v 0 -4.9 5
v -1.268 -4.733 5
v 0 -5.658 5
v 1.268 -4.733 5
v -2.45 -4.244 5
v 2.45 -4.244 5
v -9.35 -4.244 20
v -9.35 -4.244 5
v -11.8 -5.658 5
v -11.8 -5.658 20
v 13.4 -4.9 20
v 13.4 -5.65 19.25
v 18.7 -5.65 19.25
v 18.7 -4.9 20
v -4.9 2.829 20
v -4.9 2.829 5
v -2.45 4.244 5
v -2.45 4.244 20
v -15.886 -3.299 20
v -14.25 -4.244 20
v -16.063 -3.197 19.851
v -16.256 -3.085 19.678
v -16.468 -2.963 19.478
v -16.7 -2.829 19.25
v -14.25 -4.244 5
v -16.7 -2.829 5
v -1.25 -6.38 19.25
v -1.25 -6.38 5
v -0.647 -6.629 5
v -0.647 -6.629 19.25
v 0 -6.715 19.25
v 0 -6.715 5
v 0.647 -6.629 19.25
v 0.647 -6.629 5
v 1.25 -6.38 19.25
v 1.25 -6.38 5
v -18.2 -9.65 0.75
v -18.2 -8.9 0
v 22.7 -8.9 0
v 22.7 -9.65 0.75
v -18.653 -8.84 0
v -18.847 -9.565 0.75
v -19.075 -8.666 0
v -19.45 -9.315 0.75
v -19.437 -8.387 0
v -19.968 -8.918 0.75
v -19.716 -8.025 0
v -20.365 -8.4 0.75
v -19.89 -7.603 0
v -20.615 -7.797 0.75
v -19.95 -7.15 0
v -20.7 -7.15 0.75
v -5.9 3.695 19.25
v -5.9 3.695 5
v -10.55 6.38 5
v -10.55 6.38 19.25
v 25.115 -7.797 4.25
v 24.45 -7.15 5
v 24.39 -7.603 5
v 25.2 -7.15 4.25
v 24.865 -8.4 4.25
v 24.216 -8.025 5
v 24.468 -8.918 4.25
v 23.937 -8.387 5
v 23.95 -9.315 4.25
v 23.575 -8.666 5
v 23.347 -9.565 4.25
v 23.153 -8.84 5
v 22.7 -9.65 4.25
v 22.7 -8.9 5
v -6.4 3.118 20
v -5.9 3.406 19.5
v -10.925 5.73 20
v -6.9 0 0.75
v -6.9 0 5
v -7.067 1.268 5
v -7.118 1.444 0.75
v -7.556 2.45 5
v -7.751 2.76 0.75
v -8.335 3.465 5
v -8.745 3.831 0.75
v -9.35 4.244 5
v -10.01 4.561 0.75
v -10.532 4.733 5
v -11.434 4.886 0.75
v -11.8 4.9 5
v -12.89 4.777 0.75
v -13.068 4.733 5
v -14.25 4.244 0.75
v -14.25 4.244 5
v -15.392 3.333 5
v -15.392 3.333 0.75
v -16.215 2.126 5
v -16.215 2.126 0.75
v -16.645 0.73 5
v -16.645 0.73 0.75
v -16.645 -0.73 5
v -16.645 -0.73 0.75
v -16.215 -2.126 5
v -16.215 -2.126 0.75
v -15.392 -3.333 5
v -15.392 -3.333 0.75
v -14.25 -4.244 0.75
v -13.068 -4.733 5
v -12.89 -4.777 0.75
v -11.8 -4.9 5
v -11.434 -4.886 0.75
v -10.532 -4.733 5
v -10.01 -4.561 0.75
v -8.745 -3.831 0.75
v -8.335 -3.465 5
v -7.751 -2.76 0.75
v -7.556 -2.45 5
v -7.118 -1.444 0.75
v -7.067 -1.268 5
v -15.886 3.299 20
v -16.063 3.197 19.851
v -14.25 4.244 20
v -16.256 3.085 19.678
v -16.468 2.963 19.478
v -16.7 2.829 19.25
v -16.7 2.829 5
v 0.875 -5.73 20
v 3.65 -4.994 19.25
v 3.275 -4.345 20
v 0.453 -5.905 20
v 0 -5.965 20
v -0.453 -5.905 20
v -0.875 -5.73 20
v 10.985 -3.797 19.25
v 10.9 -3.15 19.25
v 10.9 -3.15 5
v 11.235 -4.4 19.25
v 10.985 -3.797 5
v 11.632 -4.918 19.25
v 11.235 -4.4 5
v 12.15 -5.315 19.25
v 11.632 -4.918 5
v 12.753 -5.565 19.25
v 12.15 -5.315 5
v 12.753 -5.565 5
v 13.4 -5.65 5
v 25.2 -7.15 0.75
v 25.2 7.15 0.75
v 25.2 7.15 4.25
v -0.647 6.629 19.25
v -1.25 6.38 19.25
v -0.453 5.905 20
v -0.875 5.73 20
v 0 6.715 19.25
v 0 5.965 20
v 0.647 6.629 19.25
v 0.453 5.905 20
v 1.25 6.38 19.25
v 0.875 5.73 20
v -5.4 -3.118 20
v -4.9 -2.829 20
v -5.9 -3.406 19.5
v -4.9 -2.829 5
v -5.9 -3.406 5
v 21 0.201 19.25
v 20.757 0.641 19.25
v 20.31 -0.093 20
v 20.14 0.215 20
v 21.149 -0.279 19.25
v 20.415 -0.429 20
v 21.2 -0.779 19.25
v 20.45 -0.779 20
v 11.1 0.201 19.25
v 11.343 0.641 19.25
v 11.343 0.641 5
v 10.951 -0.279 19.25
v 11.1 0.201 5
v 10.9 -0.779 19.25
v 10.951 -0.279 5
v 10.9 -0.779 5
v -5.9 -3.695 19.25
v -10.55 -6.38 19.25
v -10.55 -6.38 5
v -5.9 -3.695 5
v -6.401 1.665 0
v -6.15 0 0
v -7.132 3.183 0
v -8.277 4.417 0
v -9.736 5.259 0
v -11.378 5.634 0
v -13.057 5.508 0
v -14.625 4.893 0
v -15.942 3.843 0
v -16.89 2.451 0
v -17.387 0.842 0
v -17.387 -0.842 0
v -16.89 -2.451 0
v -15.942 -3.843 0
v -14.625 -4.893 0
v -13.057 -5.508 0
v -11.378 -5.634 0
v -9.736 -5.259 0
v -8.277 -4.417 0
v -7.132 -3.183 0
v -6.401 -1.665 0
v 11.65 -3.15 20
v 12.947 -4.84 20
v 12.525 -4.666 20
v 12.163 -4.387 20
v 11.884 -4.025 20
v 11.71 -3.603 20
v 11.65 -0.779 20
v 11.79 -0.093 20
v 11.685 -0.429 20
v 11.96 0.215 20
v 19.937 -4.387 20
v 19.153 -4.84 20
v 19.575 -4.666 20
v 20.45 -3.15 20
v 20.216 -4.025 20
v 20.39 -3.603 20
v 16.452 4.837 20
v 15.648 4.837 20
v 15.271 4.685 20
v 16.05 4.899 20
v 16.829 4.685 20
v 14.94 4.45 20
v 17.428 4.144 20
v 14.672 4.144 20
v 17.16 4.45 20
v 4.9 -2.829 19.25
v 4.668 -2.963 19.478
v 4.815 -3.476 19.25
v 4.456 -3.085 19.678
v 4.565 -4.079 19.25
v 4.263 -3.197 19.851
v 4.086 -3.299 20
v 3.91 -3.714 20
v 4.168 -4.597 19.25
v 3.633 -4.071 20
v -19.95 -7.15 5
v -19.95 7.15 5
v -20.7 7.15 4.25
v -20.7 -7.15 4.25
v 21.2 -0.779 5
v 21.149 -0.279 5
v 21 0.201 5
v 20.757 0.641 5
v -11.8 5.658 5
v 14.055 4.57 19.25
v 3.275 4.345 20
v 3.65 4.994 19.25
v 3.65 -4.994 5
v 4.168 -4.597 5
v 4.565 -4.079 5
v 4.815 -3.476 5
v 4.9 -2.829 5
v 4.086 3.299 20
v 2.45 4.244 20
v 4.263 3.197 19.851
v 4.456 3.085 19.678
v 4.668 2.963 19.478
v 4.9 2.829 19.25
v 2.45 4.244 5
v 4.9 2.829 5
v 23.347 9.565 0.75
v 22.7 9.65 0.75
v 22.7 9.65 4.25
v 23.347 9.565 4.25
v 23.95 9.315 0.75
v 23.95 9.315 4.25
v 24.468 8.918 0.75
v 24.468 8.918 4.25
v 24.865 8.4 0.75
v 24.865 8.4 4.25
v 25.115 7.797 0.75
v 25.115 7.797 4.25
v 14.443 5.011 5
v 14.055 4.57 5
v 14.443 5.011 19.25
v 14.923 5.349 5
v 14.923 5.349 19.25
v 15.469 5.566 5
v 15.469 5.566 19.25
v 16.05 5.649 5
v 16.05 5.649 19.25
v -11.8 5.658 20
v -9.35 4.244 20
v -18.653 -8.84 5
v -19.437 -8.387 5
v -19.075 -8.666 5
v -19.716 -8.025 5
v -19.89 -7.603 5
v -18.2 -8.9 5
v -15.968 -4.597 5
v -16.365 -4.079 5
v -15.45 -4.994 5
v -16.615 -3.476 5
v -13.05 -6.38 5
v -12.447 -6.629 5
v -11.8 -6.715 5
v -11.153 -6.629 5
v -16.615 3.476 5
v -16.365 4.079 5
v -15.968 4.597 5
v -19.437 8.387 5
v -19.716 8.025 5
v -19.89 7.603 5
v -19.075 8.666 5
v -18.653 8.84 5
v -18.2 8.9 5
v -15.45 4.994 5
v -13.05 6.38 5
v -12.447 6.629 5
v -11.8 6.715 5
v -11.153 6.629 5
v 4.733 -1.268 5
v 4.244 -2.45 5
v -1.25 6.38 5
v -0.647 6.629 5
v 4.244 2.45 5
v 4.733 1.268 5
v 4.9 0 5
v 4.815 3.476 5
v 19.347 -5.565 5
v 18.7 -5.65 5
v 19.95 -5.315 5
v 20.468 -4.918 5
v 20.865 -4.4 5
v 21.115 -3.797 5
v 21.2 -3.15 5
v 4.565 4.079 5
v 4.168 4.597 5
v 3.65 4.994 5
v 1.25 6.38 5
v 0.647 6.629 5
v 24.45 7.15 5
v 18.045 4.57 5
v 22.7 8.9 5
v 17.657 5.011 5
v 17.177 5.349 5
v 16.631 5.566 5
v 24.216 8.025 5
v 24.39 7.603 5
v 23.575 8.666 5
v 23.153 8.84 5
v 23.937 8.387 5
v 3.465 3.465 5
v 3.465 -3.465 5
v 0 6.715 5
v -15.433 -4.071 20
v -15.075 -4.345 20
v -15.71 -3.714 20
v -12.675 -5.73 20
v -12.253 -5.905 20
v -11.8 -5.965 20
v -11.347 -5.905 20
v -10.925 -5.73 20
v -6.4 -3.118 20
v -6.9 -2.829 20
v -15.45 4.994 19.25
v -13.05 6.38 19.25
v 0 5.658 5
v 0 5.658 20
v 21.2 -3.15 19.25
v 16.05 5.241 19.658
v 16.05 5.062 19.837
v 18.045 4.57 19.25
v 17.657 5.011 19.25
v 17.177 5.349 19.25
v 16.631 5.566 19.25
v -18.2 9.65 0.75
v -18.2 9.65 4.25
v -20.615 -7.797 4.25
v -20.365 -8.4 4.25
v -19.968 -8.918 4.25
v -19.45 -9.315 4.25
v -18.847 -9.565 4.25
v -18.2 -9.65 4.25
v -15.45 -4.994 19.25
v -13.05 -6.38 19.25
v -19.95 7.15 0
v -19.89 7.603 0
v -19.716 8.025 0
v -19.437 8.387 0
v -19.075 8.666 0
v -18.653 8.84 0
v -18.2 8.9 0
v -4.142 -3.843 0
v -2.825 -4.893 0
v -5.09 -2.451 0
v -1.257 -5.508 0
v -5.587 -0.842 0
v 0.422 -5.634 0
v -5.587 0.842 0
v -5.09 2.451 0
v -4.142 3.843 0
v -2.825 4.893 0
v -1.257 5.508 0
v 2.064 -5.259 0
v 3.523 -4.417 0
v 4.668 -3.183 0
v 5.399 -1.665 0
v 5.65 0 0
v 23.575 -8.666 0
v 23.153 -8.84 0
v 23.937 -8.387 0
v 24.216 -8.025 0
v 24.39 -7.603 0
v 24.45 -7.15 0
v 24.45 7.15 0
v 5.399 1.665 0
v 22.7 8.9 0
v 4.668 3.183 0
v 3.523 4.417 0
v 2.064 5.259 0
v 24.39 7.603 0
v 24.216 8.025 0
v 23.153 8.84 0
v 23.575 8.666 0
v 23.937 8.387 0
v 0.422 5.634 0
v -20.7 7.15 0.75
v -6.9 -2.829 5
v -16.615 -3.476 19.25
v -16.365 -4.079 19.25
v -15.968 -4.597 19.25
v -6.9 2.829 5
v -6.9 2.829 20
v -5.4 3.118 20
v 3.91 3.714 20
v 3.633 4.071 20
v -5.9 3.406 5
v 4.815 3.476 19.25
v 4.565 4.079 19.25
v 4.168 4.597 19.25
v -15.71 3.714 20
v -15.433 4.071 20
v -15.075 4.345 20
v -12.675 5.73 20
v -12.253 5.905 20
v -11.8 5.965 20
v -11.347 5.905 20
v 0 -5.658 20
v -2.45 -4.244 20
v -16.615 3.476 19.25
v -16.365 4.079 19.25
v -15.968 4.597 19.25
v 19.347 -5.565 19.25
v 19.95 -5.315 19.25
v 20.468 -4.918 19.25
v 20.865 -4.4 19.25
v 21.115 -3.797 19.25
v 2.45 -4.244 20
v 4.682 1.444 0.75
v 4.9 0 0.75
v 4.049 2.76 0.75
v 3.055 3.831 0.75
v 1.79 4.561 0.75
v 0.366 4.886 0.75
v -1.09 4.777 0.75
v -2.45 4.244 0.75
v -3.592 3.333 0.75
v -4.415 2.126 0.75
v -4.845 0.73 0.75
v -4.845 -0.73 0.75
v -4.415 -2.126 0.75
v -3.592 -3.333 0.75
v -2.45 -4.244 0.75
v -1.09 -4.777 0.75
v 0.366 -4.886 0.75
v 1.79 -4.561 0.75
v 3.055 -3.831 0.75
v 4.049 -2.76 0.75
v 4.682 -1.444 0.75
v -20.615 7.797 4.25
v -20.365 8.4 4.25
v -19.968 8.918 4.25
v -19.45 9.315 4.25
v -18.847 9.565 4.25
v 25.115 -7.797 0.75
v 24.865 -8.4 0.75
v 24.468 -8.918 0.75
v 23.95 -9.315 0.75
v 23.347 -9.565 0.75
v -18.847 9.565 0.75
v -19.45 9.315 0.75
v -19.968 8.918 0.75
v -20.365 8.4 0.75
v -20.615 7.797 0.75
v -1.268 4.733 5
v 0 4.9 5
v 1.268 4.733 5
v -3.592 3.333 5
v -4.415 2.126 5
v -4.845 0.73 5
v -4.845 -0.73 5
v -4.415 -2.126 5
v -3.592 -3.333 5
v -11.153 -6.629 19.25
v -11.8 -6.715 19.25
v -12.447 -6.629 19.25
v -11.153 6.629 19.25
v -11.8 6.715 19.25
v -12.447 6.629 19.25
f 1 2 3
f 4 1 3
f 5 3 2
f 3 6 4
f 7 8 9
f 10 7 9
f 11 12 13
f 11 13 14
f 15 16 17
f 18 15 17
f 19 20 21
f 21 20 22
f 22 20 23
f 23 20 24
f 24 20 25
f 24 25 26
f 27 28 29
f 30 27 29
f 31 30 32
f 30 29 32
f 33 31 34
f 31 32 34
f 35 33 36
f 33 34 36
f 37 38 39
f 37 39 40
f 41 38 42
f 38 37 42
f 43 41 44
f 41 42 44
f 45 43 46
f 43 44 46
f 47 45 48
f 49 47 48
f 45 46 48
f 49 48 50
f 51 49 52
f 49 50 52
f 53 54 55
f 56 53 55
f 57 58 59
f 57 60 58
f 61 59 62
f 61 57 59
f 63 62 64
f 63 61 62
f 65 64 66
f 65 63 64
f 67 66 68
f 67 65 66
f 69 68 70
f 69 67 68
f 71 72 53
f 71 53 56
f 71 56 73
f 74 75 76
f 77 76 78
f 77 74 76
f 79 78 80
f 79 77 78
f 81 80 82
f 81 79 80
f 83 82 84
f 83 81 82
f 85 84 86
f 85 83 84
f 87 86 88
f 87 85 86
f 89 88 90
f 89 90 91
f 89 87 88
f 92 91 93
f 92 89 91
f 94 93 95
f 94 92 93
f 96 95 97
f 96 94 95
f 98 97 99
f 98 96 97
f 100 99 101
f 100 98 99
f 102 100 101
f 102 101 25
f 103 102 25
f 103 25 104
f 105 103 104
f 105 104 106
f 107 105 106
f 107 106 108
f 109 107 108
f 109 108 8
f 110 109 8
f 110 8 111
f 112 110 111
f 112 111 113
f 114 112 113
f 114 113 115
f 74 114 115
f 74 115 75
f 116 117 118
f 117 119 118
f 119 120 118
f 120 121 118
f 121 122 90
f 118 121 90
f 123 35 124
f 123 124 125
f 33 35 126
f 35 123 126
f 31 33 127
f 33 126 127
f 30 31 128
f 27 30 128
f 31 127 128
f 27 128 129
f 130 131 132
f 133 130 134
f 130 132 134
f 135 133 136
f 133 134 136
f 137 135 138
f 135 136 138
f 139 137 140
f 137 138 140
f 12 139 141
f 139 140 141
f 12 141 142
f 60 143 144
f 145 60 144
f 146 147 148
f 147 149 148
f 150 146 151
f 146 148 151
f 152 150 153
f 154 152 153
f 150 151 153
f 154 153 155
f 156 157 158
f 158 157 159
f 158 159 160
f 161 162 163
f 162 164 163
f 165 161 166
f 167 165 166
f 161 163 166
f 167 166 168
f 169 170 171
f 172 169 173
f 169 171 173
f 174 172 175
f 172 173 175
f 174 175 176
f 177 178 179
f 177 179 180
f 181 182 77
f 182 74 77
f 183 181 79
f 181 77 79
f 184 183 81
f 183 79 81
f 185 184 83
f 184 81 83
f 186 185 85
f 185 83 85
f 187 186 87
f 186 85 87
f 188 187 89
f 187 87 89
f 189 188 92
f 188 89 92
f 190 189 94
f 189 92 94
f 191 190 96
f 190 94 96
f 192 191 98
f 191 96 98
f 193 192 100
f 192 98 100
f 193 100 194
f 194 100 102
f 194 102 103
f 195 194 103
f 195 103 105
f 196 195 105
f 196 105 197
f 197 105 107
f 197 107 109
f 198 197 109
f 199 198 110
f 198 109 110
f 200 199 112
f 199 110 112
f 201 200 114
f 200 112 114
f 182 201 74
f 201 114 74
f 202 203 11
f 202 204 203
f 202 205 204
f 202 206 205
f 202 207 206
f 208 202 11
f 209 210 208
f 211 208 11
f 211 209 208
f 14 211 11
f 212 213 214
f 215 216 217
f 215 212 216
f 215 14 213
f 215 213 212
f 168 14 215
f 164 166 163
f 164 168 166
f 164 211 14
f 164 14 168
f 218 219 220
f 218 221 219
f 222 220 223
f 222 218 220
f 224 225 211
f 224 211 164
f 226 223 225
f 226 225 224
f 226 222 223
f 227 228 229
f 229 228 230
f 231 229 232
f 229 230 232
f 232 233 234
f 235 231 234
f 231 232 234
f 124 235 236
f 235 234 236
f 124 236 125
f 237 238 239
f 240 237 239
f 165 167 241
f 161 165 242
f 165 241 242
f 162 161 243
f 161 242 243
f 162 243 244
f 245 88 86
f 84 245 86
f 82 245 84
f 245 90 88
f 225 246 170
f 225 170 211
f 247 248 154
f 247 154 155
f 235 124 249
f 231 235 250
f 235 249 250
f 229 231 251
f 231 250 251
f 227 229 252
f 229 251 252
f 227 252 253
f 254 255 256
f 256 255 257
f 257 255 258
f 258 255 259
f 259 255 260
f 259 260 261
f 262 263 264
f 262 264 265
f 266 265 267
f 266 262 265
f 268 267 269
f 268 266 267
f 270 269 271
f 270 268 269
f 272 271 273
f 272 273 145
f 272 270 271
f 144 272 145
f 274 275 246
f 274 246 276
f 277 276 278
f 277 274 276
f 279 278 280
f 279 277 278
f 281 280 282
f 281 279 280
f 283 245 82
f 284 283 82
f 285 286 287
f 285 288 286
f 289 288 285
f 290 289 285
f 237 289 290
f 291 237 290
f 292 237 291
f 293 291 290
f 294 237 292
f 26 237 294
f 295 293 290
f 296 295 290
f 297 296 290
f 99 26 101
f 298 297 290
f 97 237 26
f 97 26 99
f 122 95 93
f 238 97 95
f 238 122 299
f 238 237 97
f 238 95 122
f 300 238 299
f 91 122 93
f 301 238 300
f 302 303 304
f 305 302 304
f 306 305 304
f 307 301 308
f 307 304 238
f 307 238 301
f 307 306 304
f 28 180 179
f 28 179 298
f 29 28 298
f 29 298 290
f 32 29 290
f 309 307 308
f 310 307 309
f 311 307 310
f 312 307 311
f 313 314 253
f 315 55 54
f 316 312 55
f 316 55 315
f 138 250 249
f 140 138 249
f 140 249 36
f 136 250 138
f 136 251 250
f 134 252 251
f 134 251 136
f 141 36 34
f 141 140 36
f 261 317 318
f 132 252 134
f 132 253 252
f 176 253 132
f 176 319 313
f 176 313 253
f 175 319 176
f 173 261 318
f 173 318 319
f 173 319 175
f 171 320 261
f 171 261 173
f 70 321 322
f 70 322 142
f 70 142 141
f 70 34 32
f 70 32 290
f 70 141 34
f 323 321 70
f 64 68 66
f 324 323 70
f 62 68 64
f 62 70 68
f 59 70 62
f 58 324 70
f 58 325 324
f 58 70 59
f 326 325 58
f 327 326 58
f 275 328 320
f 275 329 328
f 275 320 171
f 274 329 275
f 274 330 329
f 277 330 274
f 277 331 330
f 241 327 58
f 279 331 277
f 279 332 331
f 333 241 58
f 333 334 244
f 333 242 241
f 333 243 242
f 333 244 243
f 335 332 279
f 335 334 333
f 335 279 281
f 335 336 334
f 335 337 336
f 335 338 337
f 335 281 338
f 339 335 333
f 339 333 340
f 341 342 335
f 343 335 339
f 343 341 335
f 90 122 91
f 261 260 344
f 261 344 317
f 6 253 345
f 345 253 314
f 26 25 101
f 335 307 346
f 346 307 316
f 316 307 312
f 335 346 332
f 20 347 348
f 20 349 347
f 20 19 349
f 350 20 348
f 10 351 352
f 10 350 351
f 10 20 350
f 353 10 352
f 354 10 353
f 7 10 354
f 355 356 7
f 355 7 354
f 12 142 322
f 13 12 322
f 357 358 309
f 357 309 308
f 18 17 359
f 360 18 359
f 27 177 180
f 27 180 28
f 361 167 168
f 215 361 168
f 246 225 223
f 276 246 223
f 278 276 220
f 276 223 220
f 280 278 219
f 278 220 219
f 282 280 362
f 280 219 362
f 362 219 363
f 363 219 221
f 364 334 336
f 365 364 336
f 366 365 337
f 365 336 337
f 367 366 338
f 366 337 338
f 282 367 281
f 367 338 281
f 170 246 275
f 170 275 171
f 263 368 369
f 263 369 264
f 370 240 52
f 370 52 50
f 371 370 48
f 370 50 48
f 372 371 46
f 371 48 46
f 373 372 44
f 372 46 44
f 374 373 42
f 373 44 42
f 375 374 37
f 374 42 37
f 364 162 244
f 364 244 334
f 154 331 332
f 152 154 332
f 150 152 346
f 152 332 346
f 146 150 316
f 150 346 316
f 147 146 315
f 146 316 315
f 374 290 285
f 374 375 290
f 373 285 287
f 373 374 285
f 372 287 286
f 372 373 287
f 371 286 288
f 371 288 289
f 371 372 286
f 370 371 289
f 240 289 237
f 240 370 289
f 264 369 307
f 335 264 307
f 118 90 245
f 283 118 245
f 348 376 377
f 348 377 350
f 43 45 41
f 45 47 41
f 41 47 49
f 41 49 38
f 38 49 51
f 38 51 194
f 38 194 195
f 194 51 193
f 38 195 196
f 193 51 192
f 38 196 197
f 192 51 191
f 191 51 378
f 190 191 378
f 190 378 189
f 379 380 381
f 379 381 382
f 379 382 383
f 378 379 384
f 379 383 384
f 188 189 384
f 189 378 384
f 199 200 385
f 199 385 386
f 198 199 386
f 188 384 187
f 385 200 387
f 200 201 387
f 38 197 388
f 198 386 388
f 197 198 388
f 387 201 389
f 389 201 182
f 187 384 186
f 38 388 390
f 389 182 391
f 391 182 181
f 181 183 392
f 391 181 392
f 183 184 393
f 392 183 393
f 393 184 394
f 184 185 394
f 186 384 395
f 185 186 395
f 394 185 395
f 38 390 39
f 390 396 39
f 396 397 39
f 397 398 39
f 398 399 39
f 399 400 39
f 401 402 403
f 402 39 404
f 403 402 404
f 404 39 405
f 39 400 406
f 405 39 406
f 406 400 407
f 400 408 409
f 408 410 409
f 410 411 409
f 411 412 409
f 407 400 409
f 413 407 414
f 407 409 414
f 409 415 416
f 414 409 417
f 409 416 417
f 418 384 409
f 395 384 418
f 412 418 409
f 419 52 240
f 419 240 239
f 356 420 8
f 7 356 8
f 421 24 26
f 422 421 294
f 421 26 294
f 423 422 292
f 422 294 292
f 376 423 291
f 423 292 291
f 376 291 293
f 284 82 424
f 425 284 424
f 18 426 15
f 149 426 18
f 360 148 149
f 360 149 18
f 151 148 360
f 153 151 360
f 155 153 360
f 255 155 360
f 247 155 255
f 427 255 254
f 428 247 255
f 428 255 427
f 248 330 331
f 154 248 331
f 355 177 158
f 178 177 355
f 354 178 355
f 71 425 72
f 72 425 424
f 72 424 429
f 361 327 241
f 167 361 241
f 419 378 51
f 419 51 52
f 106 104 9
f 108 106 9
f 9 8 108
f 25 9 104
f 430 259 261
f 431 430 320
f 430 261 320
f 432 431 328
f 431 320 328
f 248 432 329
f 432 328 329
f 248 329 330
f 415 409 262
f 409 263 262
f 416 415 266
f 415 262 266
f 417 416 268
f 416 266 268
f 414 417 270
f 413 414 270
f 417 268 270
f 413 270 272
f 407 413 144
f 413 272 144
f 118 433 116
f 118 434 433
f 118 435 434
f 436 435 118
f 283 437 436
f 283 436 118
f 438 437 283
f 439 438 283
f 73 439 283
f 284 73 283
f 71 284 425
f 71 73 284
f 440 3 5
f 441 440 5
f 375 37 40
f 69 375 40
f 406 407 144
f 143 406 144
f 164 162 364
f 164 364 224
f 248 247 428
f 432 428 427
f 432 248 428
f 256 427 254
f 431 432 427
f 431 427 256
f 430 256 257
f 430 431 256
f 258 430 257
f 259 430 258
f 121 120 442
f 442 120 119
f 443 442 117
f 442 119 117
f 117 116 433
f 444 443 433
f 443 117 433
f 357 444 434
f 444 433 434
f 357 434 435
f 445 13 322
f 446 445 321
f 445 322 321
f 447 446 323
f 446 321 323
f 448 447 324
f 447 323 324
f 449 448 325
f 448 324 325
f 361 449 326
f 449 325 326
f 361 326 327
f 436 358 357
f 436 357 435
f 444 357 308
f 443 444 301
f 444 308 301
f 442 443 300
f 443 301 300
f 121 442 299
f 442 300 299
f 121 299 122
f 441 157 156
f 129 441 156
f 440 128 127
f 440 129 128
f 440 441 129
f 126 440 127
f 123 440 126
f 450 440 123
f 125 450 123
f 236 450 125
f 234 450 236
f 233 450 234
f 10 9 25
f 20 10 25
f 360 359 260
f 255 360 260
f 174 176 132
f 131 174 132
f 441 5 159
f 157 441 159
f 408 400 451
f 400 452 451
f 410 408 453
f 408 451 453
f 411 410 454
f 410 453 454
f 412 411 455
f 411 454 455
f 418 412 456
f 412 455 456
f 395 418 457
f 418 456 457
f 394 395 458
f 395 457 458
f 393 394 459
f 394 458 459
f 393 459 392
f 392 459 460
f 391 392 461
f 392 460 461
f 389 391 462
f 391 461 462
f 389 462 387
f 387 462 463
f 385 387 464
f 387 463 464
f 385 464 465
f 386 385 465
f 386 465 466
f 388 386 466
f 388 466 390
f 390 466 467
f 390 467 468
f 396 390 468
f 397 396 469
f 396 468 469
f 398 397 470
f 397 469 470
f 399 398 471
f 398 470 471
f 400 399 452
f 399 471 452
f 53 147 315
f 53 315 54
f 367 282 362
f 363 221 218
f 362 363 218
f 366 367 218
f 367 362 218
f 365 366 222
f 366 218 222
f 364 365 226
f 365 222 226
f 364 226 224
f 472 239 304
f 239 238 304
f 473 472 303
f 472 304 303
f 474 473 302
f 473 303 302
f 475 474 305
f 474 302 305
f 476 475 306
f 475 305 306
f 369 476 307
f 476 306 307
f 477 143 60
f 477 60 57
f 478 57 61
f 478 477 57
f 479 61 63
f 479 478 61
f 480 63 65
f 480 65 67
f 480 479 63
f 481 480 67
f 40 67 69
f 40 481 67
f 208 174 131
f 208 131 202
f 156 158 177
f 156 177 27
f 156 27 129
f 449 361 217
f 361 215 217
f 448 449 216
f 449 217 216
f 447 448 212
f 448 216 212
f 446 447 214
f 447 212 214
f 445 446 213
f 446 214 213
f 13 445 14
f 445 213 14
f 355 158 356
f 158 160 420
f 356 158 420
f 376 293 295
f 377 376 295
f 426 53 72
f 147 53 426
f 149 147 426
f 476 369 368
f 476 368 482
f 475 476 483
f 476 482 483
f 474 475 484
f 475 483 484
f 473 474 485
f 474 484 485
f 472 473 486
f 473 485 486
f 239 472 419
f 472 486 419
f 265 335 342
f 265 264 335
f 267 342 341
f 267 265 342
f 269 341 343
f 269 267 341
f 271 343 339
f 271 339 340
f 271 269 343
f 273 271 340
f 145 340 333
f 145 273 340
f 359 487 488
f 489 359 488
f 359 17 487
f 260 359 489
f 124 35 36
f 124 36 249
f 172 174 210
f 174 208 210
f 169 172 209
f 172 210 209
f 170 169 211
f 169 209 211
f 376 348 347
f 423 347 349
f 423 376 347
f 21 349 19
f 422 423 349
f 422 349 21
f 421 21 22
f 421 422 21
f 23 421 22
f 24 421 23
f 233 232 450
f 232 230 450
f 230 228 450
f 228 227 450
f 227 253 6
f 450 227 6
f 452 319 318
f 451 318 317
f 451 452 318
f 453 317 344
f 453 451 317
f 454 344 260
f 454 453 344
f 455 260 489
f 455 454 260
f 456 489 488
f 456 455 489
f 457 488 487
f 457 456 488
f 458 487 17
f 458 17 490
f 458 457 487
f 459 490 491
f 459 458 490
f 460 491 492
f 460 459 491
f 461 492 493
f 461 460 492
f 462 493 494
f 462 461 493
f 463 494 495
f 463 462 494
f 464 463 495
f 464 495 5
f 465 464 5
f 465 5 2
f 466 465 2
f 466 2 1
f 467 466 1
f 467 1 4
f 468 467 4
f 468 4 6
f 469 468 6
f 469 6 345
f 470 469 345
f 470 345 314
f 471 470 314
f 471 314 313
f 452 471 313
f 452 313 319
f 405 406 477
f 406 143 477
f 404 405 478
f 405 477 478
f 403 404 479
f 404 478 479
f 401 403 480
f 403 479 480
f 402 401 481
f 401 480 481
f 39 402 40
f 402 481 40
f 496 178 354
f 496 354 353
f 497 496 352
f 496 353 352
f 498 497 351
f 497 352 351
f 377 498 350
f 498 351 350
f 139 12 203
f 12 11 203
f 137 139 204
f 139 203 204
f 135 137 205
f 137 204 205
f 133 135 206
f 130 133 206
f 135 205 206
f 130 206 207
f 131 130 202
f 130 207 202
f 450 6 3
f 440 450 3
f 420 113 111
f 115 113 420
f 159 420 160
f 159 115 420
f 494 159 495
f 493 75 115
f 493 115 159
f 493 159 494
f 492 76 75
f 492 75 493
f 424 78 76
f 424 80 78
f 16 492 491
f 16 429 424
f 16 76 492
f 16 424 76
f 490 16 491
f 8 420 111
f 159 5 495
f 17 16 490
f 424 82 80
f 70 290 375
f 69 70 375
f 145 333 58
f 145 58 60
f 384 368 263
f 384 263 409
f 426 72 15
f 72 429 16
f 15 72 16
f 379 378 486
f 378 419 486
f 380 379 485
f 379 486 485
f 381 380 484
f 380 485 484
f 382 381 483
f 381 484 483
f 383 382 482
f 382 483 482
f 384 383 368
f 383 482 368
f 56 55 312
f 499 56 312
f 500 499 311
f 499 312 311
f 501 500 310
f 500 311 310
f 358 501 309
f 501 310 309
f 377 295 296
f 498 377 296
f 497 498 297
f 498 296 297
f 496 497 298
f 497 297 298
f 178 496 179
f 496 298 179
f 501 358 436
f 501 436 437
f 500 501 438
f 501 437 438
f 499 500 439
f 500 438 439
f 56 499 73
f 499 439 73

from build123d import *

# Parameters (mm, degrees)
F0_W          = 45.9
F0_H          = 19.3
F0_R          = 4.9
F1_DEPTH      = 5
F3_DEPTH      = 15
F4_T1_DEPTH   = 17.5
F4_T3_DEPTH   = 18.2802116758
F4_T5_DEPTH   = 21.25
F4_T7_DEPTH   = 16.9476143508
F4_T9_DEPTH   = 18.6084391824
F4_T11_DEPTH  = 22.2168783649
F5_T1_DEPTH   = 4.7741809443
F5_T3_DEPTH   = 2.3709542597
F5_T5_DEPTH   = 5.3
F5_T7_DEPTH   = 4.7741809443
F5_T9_DEPTH   = 40.9
F5_T11_DEPTH  = 14.3
F5_T13_DEPTH  = 2.7712812921
F5_T15_DEPTH  = 2.7712812921
F5_T17_DEPTH  = 2.7712812921
F5_T19_DEPTH  = 2.7712812921
F5_T22_ANGLE  = 98.1713551602
F5_T24_ANGLE  = 98.1713551602
F5_T26_ANGLE  = 34.6159793172
F5_T28_ANGLE  = 90.0000000053
F5_T30_ANGLE  = 90.0000000053
F5_T32_ANGLE  = 34.6159793172
F5_T34_ANGLE  = 90.0000000053
F5_T36_ANGLE  = 90.0000000053
F5_T38_ANGLE  = 90.0000000053
F5_T40_ANGLE  = 90.0000000053
F5_T48_DEPTH  = 7.2981197444
F5_T51_ANGLE  = 60.0000000105
F5_T53_ANGLE  = 90.0000000053
F5_T55_ANGLE  = 90.0000000053
F5_T57_ANGLE  = 90.0000000053
F5_T59_ANGLE  = 90.0000000053
F5_T63_DEPTH  = 7.2981197444
F5_T68_DEPTH  = 7.2981197444
F5_T71_ANGLE  = 60.0000000105
F5_T73_ANGLE  = 60.0000000105
F5_T77_DEPTH  = 7.2981197444
F5_T80_ANGLE  = 60.0000000105
F5_T82_ANGLE  = 104.2118652522
F5_T84_ANGLE  = 104.2118652522
F5_T86_ANGLE  = 104.2118652522
F5_T88_ANGLE  = 104.2118652522
F5_T93_DEPTH  = 7.2981197444
F5_T97_DEPTH  = 7.2981197444
F5_T104_DEPTH = 7.2981197444
F5_T108_DEPTH = 7.2981197444


# Not quite as in the source:
# - a fillet or chamfer that OpenCascade refuses, or shapes differently, is made with other operations: its cross-section is extruded or revolved along the edge and cut away or added
# - a feature names something its author has since deleted; it is built from what else it names


with BuildPart() as f1:
    # F0 (on Top) → F1 (new body)
    with BuildSketch(Plane.XY):
        with Locations((2.25, 0)):
            Rectangle(F0_W, F0_H)
        with Locations((-11.8, 0)):
            Circle(F0_R, mode=Mode.SUBTRACT)
        Circle(F0_R, mode=Mode.SUBTRACT)
        Polygon((10.9, 0), (14.8, 5.65), (17.3, 5.65), (21.2, 0), (21.2, -5.65), (10.9, -5.65), align=None, mode=Mode.SUBTRACT)
        Polygon((17.3, 5.65), (14.8, 5.65), (10.9, 0), (10.9, -5.65), (21.2, -5.65), (21.2, 0), align=None)
    extrude(amount=F1_DEPTH)

    # F2 (on face) → F3 (join)
    with BuildSketch(Plane.XY.offset(5)):
        Polygon((14.8, 5.65), (10.9, 0), (10.9, -5.65), (21.2, -5.65), (21.2, 0), (17.3, 5.65), align=None)
        Polygon((-5.65, -3.5507041555), (-5.9, -3.4063665882), (-6.15, -3.5507041555), (-5.9, -3.6950417228), align=None)
        Polygon((-5.9, -3.4063665882), (-6.9, -2.829016319), (-9.3500000593, -4.2435245128), (-11.8, -5.6580326381), (-14.2500001426, -4.2435243962), (-16.7, -2.829016319), (-17.95, -3.5507041555), (-11.8, -7.101408311), (-5.9, -3.6950417228), (-6.15, -3.5507041555), align=None)
        Polygon((-4.9, -2.829016319), (-5.9, -3.4063665882), (-5.65, -3.5507041555), (-5.9, -3.6950417228), (0, -7.101408311), (6.15, -3.5507041555), (4.9, -2.829016319), (2.4499999307, -4.2435245185), (0, -5.6580326381), (-2.4500000255, -4.2435244638), align=None)
        Polygon((-4.9, 2.829016319), (-2.4499999531, 4.2435245056), (0, 5.6580326381), (2.4500000055, 4.2435244754), (4.9, 2.829016319), (6.15, 3.5507041555), (0, 7.101408311), (-5.9, 3.6950417228), (-5.65, 3.5507041555), (-5.9, 3.4063665882), align=None)
        Polygon((-16.7, 2.829016319), (-14.2499999083, 4.2435245315), (-11.8, 5.6580326381), (-9.3500001117, 4.243524543), (-6.9, 2.829016319), (-5.9, 3.4063665882), (-6.15, 3.5507041555), (-5.9, 3.6950417228), (-11.8, 7.101408311), (-17.95, 3.5507041555), align=None)
        Polygon((-6.15, 3.5507041555), (-5.9, 3.4063665882), (-5.65, 3.5507041555), (-5.9, 3.6950417228), align=None)
    extrude(amount=F3_DEPTH)

    # F4: fillet of radius 2.5 on 18 edges, made by hand

    # F4_s2 → F4_t1 (cut)
    with BuildSketch(Plane.XY.offset(-6.25)):
        with BuildLine():
            ThreePointArc((25.2, -7.15), (24.467766953, -8.917766953), (22.7, -9.65))
            Line((22.7, -9.65), (25.2, -9.65))
            Line((25.2, -9.65), (25.2, -7.15))
        make_face()
        with BuildLine():
            ThreePointArc((22.7, 9.65), (24.467766953, 8.917766953), (25.2, 7.15))
            Line((25.2, 7.15), (25.2, 9.65))
            Line((25.2, 9.65), (22.7, 9.65))
        make_face()
        with BuildLine():
            ThreePointArc((-18.2, 9.65), (-19.967766953, 8.917766953), (-20.7, 7.15))
            Line((-20.7, 7.15), (-20.7, 9.65))
            Line((-20.7, 9.65), (-18.2, 9.65))
        make_face()
        with BuildLine():
            ThreePointArc((-20.7, -7.15), (-19.967766953, -8.917766953), (-18.2, -9.65))
            Line((-18.2, -9.65), (-20.7, -9.65))
            Line((-20.7, -9.65), (-20.7, -7.15))
        make_face()
    extrude(amount=F4_T1_DEPTH, mode=Mode.SUBTRACT)

    # F4_s4 → F4_t3 (cut)
    with BuildSketch(Plane.XY.offset(5)):
        with BuildLine():
            ThreePointArc((14.0546397462, 4.570183222), (14.9502882284, 5.3636460935), (16.1120846703, 5.65))
            Line((16.1120846703, 5.65), (14.8, 5.65))
            Line((14.8, 5.65), (14.0546397462, 4.570183222))
        make_face()
        with BuildLine():
            ThreePointArc((18.0453602538, 4.570183222), (17.1497117716, 5.3636460935), (15.9879153297, 5.65))
            Line((15.9879153297, 5.65), (17.3, 5.65))
            Line((17.3, 5.65), (18.0453602538, 4.570183222))
        make_face()
    extrude(amount=F4_T3_DEPTH, mode=Mode.SUBTRACT)

    # F4_s6 → F4_t5 (cut)
    with BuildSketch(Plane.XY.offset(5)):
        with BuildLine():
            ThreePointArc((18.7, -5.65), (20.467766953, -4.917766953), (21.2, -3.15))
            Line((21.2, -3.15), (21.2, -5.65))
            Line((21.2, -5.65), (18.7, -5.65))
        make_face()
        with BuildLine():
            ThreePointArc((10.9, -3.15), (11.632233047, -4.917766953), (13.4, -5.65))
            Line((13.4, -5.65), (10.9, -5.65))
            Line((10.9, -5.65), (10.9, -3.15))
        make_face()
    extrude(amount=F4_T5_DEPTH, mode=Mode.SUBTRACT)

    # F4_s8 → F4_t7 (cut)
    with BuildSketch(Plane.XY.offset(5)):
        with BuildLine():
            ThreePointArc((21.2, -0.7790457403), (21.0867983064, -0.0352757189), (20.7574449242, 0.6411374817))
            Line((20.7574449242, 0.6411374817), (21.2, 0))
            Line((21.2, 0), (21.2, -0.7790457403))
        make_face()
        with BuildLine():
            ThreePointArc((11.3425550758, 0.6411374817), (11.0132016936, -0.0352757189), (10.9, -0.7790457403))
            Line((10.9, -0.7790457403), (10.9, 0))
            Line((10.9, 0), (11.3425550758, 0.6411374817))
        make_face()
    extrude(amount=F4_T7_DEPTH, mode=Mode.SUBTRACT)

    # F4_s10 → F4_t9 (cut)
    with BuildSketch(Plane.XY.offset(5)):
        with BuildLine():
            ThreePointArc((-1.25, -6.3797204745), (0, -6.7146569651), (1.25, -6.3797204745))
            Line((1.25, -6.3797204745), (0, -7.101408311))
            Line((0, -7.101408311), (-1.25, -6.3797204745))
        make_face()
        with BuildLine():
            ThreePointArc((-13.05, -6.3797204745), (-11.8, -6.7146569651), (-10.55, -6.3797204745))
            Line((-10.55, -6.3797204745), (-11.8, -7.101408311))
            Line((-11.8, -7.101408311), (-13.05, -6.3797204745))
        make_face()
        with BuildLine():
            ThreePointArc((1.25, 6.3797204745), (0, 6.7146569651), (-1.25, 6.3797204745))
            Line((-1.25, 6.3797204745), (0, 7.101408311))
            Line((0, 7.101408311), (1.25, 6.3797204745))
        make_face()
        with BuildLine():
            ThreePointArc((-10.55, 6.3797204745), (-11.8, 6.7146569651), (-13.05, 6.3797204745))
            Line((-13.05, 6.3797204745), (-11.8, 7.101408311))
            Line((-11.8, 7.101408311), (-10.55, 6.3797204745))
        make_face()
    extrude(amount=F4_T9_DEPTH, mode=Mode.SUBTRACT)

    # F4_s12 → F4_t11 (cut)
    with BuildSketch(Plane.XY.offset(5)):
        with BuildLine():
            ThreePointArc((4.9, 2.829016319), (4.5650635095, 4.079016319), (3.65, 4.9940798285))
            Line((3.65, 4.9940798285), (6.15, 3.5507041555))
            Line((6.15, 3.5507041555), (4.9, 2.829016319))
        make_face()
        with BuildLine():
            ThreePointArc((3.65, -4.9940798285), (4.5650635095, -4.079016319), (4.9, -2.829016319))
            Line((4.9, -2.829016319), (6.15, -3.5507041555))
            Line((6.15, -3.5507041555), (3.65, -4.9940798285))
        make_face()
        with BuildLine():
            ThreePointArc((-16.7, -2.829016319), (-16.3650635095, -4.079016319), (-15.45, -4.9940798285))
            Line((-15.45, -4.9940798285), (-17.95, -3.5507041555))
            Line((-17.95, -3.5507041555), (-16.7, -2.829016319))
        make_face()
        with BuildLine():
            ThreePointArc((-15.45, 4.9940798285), (-16.3650635095, 4.079016319), (-16.7, 2.829016319))
            Line((-16.7, 2.829016319), (-17.95, 3.5507041555))
            Line((-17.95, 3.5507041555), (-15.45, 4.9940798285))
        make_face()
    extrude(amount=F4_T11_DEPTH, mode=Mode.SUBTRACT)

    # F5: chamfer of 0.75 on 45 edges, made by hand

    # F5_s2 → F5_t1 (cut)
    with BuildSketch(Plane(origin=(6.3988388668, -9.2701127172, 0), x_dir=(0, 0, 1), z_dir=(-0.5680732888, 0.8229779697, 0))):
        Polygon((19.25, 17.4471329569), (20, 16.6971329569), (20, 17.4471329569), align=None)
    extrude(amount=F5_T1_DEPTH, mode=Mode.SUBTRACT)

    # F5_s4 → F5_t3 (cut)
    with BuildSketch(Plane.XZ.offset(0.7790457403)):
        Polygon((21.2, 19.25), (20.45, 20), (21.2, 20), align=None)
        Polygon((10.9, 19.25), (11.65, 20), (10.9, 20), align=None)
    extrude(amount=F5_T3_DEPTH, mode=Mode.SUBTRACT)

    # F5_s6 → F5_t5 (cut)
    with BuildSketch(Plane.YZ.offset(13.4)):
        Polygon((-5.65, 19.25), (-4.9, 20), (-5.65, 20), align=None)
    extrude(amount=F5_T5_DEPTH, mode=Mode.SUBTRACT)

    # F5_s8 → F5_t7 (cut)
    with BuildSketch(Plane(origin=(6.6721488959, 9.666061862, 0), x_dir=(0, 0, 1), z_dir=(-0.5680732888, -0.8229779697, 0))):
        Polygon((19.25, -8.9704598694), (20, -9.7204598694), (20, -8.9704598694), align=None)
    extrude(amount=F5_T7_DEPTH, mode=Mode.SUBTRACT)

    # F5_s10 → F5_t9 (cut)
    with BuildSketch(Plane.YZ.offset(-18.2)):
        Polygon((-8.9, 5), (-9.65, 4.25), (-9.65, 5), align=None)
        Polygon((-8.9, 0), (-9.65, 0.75), (-9.65, 0), align=None)
        Polygon((9.65, 0.75), (8.9, 0), (9.65, 0), align=None)
        Polygon((9.65, 4.25), (8.9, 5), (9.65, 5), align=None)
    extrude(amount=F5_T9_DEPTH, mode=Mode.SUBTRACT)

    # F5_s12 → F5_t11 (cut)
    with BuildSketch(Plane.XZ.offset(-7.15)):
        Polygon((24.45, 0), (25.2, 0.75), (25.2, 0), align=None)
        Polygon((-19.95, 0), (-20.7, 0.75), (-20.7, 0), align=None)
        Polygon((-19.95, 5), (-20.7, 4.25), (-20.7, 5), align=None)
        Polygon((24.45, 5), (25.2, 4.25), (25.2, 5), align=None)
    extrude(amount=F5_T11_DEPTH, mode=Mode.SUBTRACT)

    # F5_s14 → F5_t13 (cut)
    with BuildSketch(Plane(origin=(-1.825, -1.0536642413, 0), x_dir=(0, 0, 1), z_dir=(0.8660254038, 0.5, 0))):
        Polygon((19.25, 6.15), (20, 5.4), (20, 6.15), align=None)
    extrude(amount=F5_T13_DEPTH, mode=Mode.SUBTRACT)

    # F5_s16 → F5_t15 (cut)
    with BuildSketch(Plane(origin=(0.575, -0.3319764048, 0), x_dir=(0, 0, 1), z_dir=(-0.8660254038, 0.5, 0))):
        Polygon((19.25, 6.15), (20, 5.4), (20, 6.15), align=None)
    extrude(amount=F5_T15_DEPTH, mode=Mode.SUBTRACT)

    # F5_s18 → F5_t17 (cut)
    with BuildSketch(Plane(origin=(-7.025, -4.0558856411, 0), x_dir=(0, 0, 1), z_dir=(-0.8660254038, -0.5, 0))):
        Polygon((19.25, 12.05), (20, 11.3), (20, 12.05), align=None)
    extrude(amount=F5_T17_DEPTH, mode=Mode.SUBTRACT)

    # F5_s20 → F5_t19 (cut)
    with BuildSketch(Plane(origin=(-9.425, 5.4415262871, 0), x_dir=(0, 0, 1), z_dir=(0.8660254038, -0.5, 0))):
        Polygon((19.25, 12.05), (20, 11.3), (20, 12.05), align=None)
    extrude(amount=F5_T19_DEPTH, mode=Mode.SUBTRACT)

    # F5_s21 → F5_t22 (revolve, cut)
    with BuildSketch(Plane(origin=(6.6721488969, 9.6660618621, 0), x_dir=(0, 0, 1), z_dir=(-0.5680732888, -0.8229779696, 0))):
        Polygon((19.25, -8.9704598686), (20, -9.7204598686), (20, -8.9704598686), align=None)
    revolve(axis=Axis((16.1120846705, 3.1499999997, 20), (0, 0, -1)), revolution_arc=F5_T22_ANGLE, mode=Mode.SUBTRACT)

    # F5_s23 → F5_t24 (revolve, cut)
    with BuildSketch(Plane(origin=(10.1810745714, 9.4235988418, 0), x_dir=(0, 0, 1), z_dir=(-0.7338800405, -0.6792790929, 0))):
        Polygon((19.25, -6.0485344953), (20, -6.7985344953), (20, -6.0485344953), align=None)
    revolve(axis=Axis((15.9879153295, 3.1499999997, 20), (0, 0, -1)), revolution_arc=F5_T24_ANGLE, mode=Mode.SUBTRACT)

    # F5_s25 → F5_t26 (revolve, cut)
    with BuildSketch(Plane(origin=(6.3988388671, -9.2701127174, 0), x_dir=(0, 0, 1), z_dir=(-0.5680732888, 0.8229779697, 0))):
        Polygon((19.25, 17.4471329568), (20, 16.6971329568), (20, 17.4471329568), align=None)
    revolve(axis=Axis((18.7000000003, -0.7790457401, 20), (0, 0, -1)), revolution_arc=F5_T26_ANGLE, mode=Mode.SUBTRACT)

    # F5_s27 → F5_t28 (revolve, cut)
    with BuildSketch(Plane.XZ.offset(3.1500000001)):
        Polygon((21.2, 19.25), (20.45, 20), (21.2, 20), align=None)
    revolve(axis=Axis((18.7000000001, -3.1500000001, 20), (0, 0, -1)), revolution_arc=F5_T28_ANGLE, mode=Mode.SUBTRACT)

    # F5_s29 → F5_t30 (revolve, cut)
    with BuildSketch(Plane.YZ.offset(13.3999999999)):
        Polygon((-5.65, 19.25), (-4.9, 20), (-5.65, 20), align=None)
    revolve(axis=Axis((13.3999999999, -3.1500000001, 20), (0, 0, -1)), revolution_arc=F5_T30_ANGLE, mode=Mode.SUBTRACT)

    # F5_s31 → F5_t32 (revolve, cut)
    with BuildSketch(Plane.XZ.offset(0.7790457401)):
        Polygon((10.9, 19.25), (11.65, 20), (10.9, 20), align=None)
    revolve(axis=Axis((13.3999999997, -0.7790457401, 20), (0, 0, -1)), revolution_arc=F5_T32_ANGLE, mode=Mode.SUBTRACT)

    # F5_s33 → F5_t34 (revolve, cut)
    with BuildSketch(Plane.YZ.offset(22.7000000001)):
        Polygon((8.9, 0), (9.65, 0.75), (9.65, 0), align=None)
    revolve(axis=Axis((22.7000000001, 7.1500000001, 0), (0, 0, -1)), revolution_arc=F5_T34_ANGLE, mode=Mode.SUBTRACT)

    # F5_s35 → F5_t36 (revolve, cut)
    with BuildSketch(Plane.XZ.offset(7.1500000001)):
        Polygon((24.45, 0), (25.2, 0.75), (25.2, 0), align=None)
    revolve(axis=Axis((22.7000000001, -7.1500000001, 0), (0, 0, -1)), revolution_arc=F5_T36_ANGLE, mode=Mode.SUBTRACT)

    # F5_s37 → F5_t38 (revolve, cut)
    with BuildSketch(Plane.YZ.offset(-18.2000000001)):
        Polygon((-8.9, 0), (-9.65, 0.75), (-9.65, 0), align=None)
    revolve(axis=Axis((-18.2000000001, -7.1500000001, 0), (0, 0, -1)), revolution_arc=F5_T38_ANGLE, mode=Mode.SUBTRACT)

    # F5_s39 → F5_t40 (revolve, cut)
    with BuildSketch(Plane.XZ.offset(-7.1500000001)):
        Polygon((-19.95, 0), (-20.7, 0.75), (-20.7, 0), align=None)
    revolve(axis=Axis((-18.2000000001, 7.1500000001, 0), (0, 0, -1)), revolution_arc=F5_T40_ANGLE, mode=Mode.SUBTRACT)

    # F5_s41 → F5_t42 (revolve, cut)
    with BuildSketch(Plane.XZ):
        Polygon((-6.15, 0), (-6.9, 0.75), (-6.9, 0), align=None)
    revolve(axis=Axis((-11.8, 0, 0), (0, 0, 1)), mode=Mode.SUBTRACT)

    # F5_s43 → F5_t44 (revolve, cut)
    with BuildSketch(Plane.XZ):
        Polygon((5.65, 0), (4.9, 0.75), (4.9, 0), align=None)
    revolve(axis=Axis((0, 0, 0), (0, 0, 1)), mode=Mode.SUBTRACT)


with BuildPart() as f5_tool46:
    # F5_s47 → F5_t48 (new body)
    with BuildSketch(Plane(origin=(-10.675, -6.1632141236, 0), x_dir=(0, 0, 1), z_dir=(0.8660254038, 0.5, 0))):
        Polygon((19.25, 0.25), (20, -0.5), (20, 0.25), align=None)
    extrude(amount=F5_T48_DEPTH)

    split(bisect_by=Plane(origin=(-3.075, -5.3260562333, 0), x_dir=(0, 0, 1), z_dir=(-0.5, -0.8660254038, 0)), keep=Keep.TOP)


with BuildPart() as f1_1:
    add(f1.part)

    # F5_t45: cut F5_tool46
    add(f5_tool46.part, mode=Mode.SUBTRACT)

    # F5_s50 → F5_t51 (revolve, cut)
    with BuildSketch(Plane(origin=(-7.0249999987, -4.0558856412, 0), x_dir=(0, 0, 1), z_dir=(-0.8660254037, -0.5000000001, 0))):
        Polygon((19.25, 12.0500000007), (20, 11.3000000007), (20, 12.0500000007), align=None)
    revolve(axis=Axis((-11.8, 4.2146569655, 20), (0, 0, -1)), revolution_arc=F5_T51_ANGLE, mode=Mode.SUBTRACT)

    # F5_s52 → F5_t53 (revolve, cut)
    with BuildSketch(Plane.XZ.offset(-7.1500000001)):
        Polygon((-20.7, 4.25), (-19.95, 5), (-20.7, 5), align=None)
    revolve(axis=Axis((-18.2000000001, 7.1500000001, 5), (0, 0, -1)), revolution_arc=F5_T53_ANGLE, mode=Mode.SUBTRACT)

    # F5_s54 → F5_t55 (revolve, cut)
    with BuildSketch(Plane.YZ.offset(22.7000000001)):
        Polygon((8.9, 5), (9.65, 4.25), (9.65, 5), align=None)
    revolve(axis=Axis((22.7000000001, 7.1500000001, 5), (0, 0, -1)), revolution_arc=F5_T55_ANGLE, mode=Mode.SUBTRACT)

    # F5_s56 → F5_t57 (revolve, cut)
    with BuildSketch(Plane.YZ.offset(-18.2000000001)):
        Polygon((-8.9, 5), (-9.65, 4.25), (-9.65, 5), align=None)
    revolve(axis=Axis((-18.2000000001, -7.1500000001, 5), (0, 0, -1)), revolution_arc=F5_T57_ANGLE, mode=Mode.SUBTRACT)

    # F5_s58 → F5_t59 (revolve, cut)
    with BuildSketch(Plane.XZ.offset(7.1500000001)):
        Polygon((24.45, 5), (25.2, 4.25), (25.2, 5), align=None)
    revolve(axis=Axis((22.7000000001, -7.1500000001, 5), (0, 0, -1)), revolution_arc=F5_T59_ANGLE, mode=Mode.SUBTRACT)


with BuildPart() as f5_tool61:
    # F5_s62 → F5_t63 (new body)
    with BuildSketch(Plane(origin=(-4.3546429015, 2.5141542514, 0), x_dir=(0, 0, 1), z_dir=(-0.8660254038, 0.5, 0))):
        Polygon((19.25, 0.25), (20, -0.5), (20, 0.25), align=None)
    extrude(amount=F5_T63_DEPTH)

    split(bisect_by=Plane(origin=(-3.075, 5.3260562333, 0), x_dir=(0, 0, 1), z_dir=(-0.5, 0.8660254038, 0)), keep=Keep.TOP)


with BuildPart() as f1_2:
    add(f1_1.part)

    # F5_t60: cut F5_tool61
    add(f5_tool61.part, mode=Mode.SUBTRACT)


with BuildPart() as f5_tool66:
    # F5_s67 → F5_t68 (new body)
    with BuildSketch(Plane(origin=(1.825, 1.0536642413, 0), x_dir=(0, 0, 1), z_dir=(-0.8660254038, -0.5, 0))):
        Polygon((19.25, 6.15), (20, 5.4), (20, 6.15), align=None)
    extrude(amount=F5_T68_DEPTH)

    split(bisect_by=Plane(origin=(0.125, 0.2165063509, 0), x_dir=(0, 0, 1), z_dir=(0.5, 0.8660254038, 0)), keep=Keep.TOP)


with BuildPart() as f1_3:
    add(f1_2.part)

    # F5_t65: cut F5_tool66
    add(f5_tool66.part, mode=Mode.SUBTRACT)

    # F5_s70 → F5_t71 (revolve, cut)
    with BuildSketch(Plane(origin=(1.8250000004, 1.0536642417, 0), x_dir=(0, 0, 1), z_dir=(-0.8660254037, -0.5000000001, 0))):
        Polygon((19.25, 6.1499999998), (20, 5.3999999998), (20, 6.1499999998), align=None)
    revolve(axis=Axis((0, 4.2146569655, 20), (0, 0, -1)), revolution_arc=F5_T71_ANGLE, mode=Mode.SUBTRACT)

    # F5_s72 → F5_t73 (revolve, cut)
    with BuildSketch(Plane(origin=(-1.8250000004, -1.0536642417, 0), x_dir=(0, 0, 1), z_dir=(0.8660254037, 0.5000000001, 0))):
        Polygon((19.25, 6.1499999998), (20, 5.3999999998), (20, 6.1499999998), align=None)
    revolve(axis=Axis((0, -4.2146569655, 20), (0, 0, -1)), revolution_arc=F5_T73_ANGLE, mode=Mode.SUBTRACT)


with BuildPart() as f5_tool75:
    # F5_s76 → F5_t77 (new body)
    with BuildSketch(Plane(origin=(-4.4953570985, 2.5953956309, 0), x_dir=(0, 0, 1), z_dir=(0.8660254038, -0.5, 0))):
        Polygon((19.25, 6.15), (20, 5.4), (20, 6.15), align=None)
    extrude(amount=F5_T77_DEPTH)

    split(bisect_by=Plane(origin=(0.125, -0.2165063509, 0), x_dir=(0, 0, 1), z_dir=(0.5, -0.8660254038, 0)), keep=Keep.TOP)


with BuildPart() as f1_4:
    add(f1_3.part)

    # F5_t74: cut F5_tool75
    add(f5_tool75.part, mode=Mode.SUBTRACT)

    # F5_s79 → F5_t80 (revolve, cut)
    with BuildSketch(Plane(origin=(-10.6749999994, -6.1632141246, 0), x_dir=(0, 0, 1), z_dir=(0.8660254037, 0.5000000001, 0))):
        Polygon((19.25, 0.2499999988), (20, -0.5000000012), (20, 0.2499999988), align=None)
    revolve(axis=Axis((-11.8, -4.2146569655, 20), (0, 0, -1)), revolution_arc=F5_T80_ANGLE, mode=Mode.SUBTRACT)

    # F5_s81 → F5_t82 (revolve, cut)
    with BuildSketch(Plane(origin=(-8.3186687816, 8.5507312317, 0), x_dir=(0, 0, 1), z_dir=(0.6973135513, -0.716766218, 0))):
        Polygon((19.25, 10.705368879), (20, 9.955368879), (20, 10.705368879), align=None)
    revolve(axis=Axis((-14.2000000001, 2.8290163191, 20), (0, 0, -1)), revolution_arc=F5_T82_ANGLE, mode=Mode.SUBTRACT)

    # F5_s83 → F5_t84 (revolve, cut)
    with BuildSketch(Plane(origin=(0.5750000001, -0.3319764048, 0), x_dir=(0, 0, 1), z_dir=(-0.8660254038, 0.5, 0))):
        Polygon((20, 5.4), (19.25, 6.15), (20, 6.15), align=None)
    revolve(axis=Axis((2.4000000001, 2.8290163191, 20), (0, 0, -1)), revolution_arc=F5_T84_ANGLE, mode=Mode.SUBTRACT)

    # F5_s85 → F5_t86 (revolve, cut)
    with BuildSketch(Plane(origin=(2.580963754, -2.6529638285, 0), x_dir=(0, 0, 1), z_dir=(-0.6973135513, 0.716766218, 0))):
        Polygon((19.25, 2.247527507), (20, 1.497527507), (20, 2.247527507), align=None)
    revolve(axis=Axis((2.4000000001, -2.8290163191, 20), (0, 0, -1)), revolution_arc=F5_T86_ANGLE, mode=Mode.SUBTRACT)

    # F5_s87 → F5_t88 (revolve, cut)
    with BuildSketch(Plane(origin=(-9.4250000003, 5.441526287, 0), x_dir=(0, 0, 1), z_dir=(0.8660254038, -0.5, 0))):
        Polygon((20, 11.2999999998), (19.25, 12.0499999998), (20, 12.0499999998), align=None)
    revolve(axis=Axis((-14.2000000001, -2.8290163191, 20), (0, 0, -1)), revolution_arc=F5_T88_ANGLE, mode=Mode.SUBTRACT)


with BuildPart() as f5_tool91:
    # F5_s92 → F5_t93 (new body)
    with BuildSketch(Plane(origin=(-4.4953570985, 2.5953956309, 0), x_dir=(0, 0, 1), z_dir=(0.8660254038, -0.5, 0))):
        Polygon((19.25, 6.15), (20, 5.4), (20, 6.15), align=None)
    extrude(amount=F5_T93_DEPTH)

    split(bisect_by=Plane(origin=(0.125, -0.2165063509, 0), x_dir=(0, 0, 1), z_dir=(-0.5, 0.8660254038, 0)), keep=Keep.TOP)


with BuildPart() as f5_tool95:
    # F5_s96 → F5_t97 (new body)
    with BuildSketch(Plane(origin=(-10.675, -6.1632141236, 0), x_dir=(0, 0, 1), z_dir=(0.8660254038, 0.5, 0))):
        Polygon((19.25, 0.25), (20, -0.5), (20, 0.25), align=None)
    extrude(amount=F5_T97_DEPTH)

    split(bisect_by=Plane(origin=(-3.075, -5.3260562333, 0), x_dir=(0, 0, 1), z_dir=(0.5, 0.8660254038, 0)), keep=Keep.TOP)


with BuildPart() as f5_tool91_1:
    add(f5_tool91.part)

    # F5_t99: intersect F5_tool95
    add(f5_tool95.part, mode=Mode.INTERSECT)


with BuildPart() as f1_5:
    add(f1_4.part)

    # F5_t89: cut F5_tool91
    add(f5_tool91_1.part, mode=Mode.SUBTRACT)


with BuildPart() as f5_tool102:
    # F5_s103 → F5_t104 (new body)
    with BuildSketch(Plane(origin=(-4.3546429015, 2.5141542514, 0), x_dir=(0, 0, 1), z_dir=(-0.8660254038, 0.5, 0))):
        Polygon((19.25, 0.25), (20, -0.5), (20, 0.25), align=None)
    extrude(amount=F5_T104_DEPTH)

    split(bisect_by=Plane(origin=(-3.075, 5.3260562333, 0), x_dir=(0, 0, 1), z_dir=(0.5, -0.8660254038, 0)), keep=Keep.TOP)


with BuildPart() as f5_tool106:
    # F5_s107 → F5_t108 (new body)
    with BuildSketch(Plane(origin=(1.825, 1.0536642413, 0), x_dir=(0, 0, 1), z_dir=(-0.8660254038, -0.5, 0))):
        Polygon((19.25, 6.15), (20, 5.4), (20, 6.15), align=None)
    extrude(amount=F5_T108_DEPTH)

    split(bisect_by=Plane(origin=(0.125, 0.2165063509, 0), x_dir=(0, 0, 1), z_dir=(-0.5, -0.8660254038, 0)), keep=Keep.TOP)


with BuildPart() as f5_tool102_1:
    add(f5_tool102.part)

    # F5_t110: intersect F5_tool106
    add(f5_tool106.part, mode=Mode.INTERSECT)


with BuildPart() as f1_6:
    add(f1_5.part)

    # F5_t100: cut F5_tool102
    add(f5_tool102_1.part, mode=Mode.SUBTRACT)


solid = f1_6.part
